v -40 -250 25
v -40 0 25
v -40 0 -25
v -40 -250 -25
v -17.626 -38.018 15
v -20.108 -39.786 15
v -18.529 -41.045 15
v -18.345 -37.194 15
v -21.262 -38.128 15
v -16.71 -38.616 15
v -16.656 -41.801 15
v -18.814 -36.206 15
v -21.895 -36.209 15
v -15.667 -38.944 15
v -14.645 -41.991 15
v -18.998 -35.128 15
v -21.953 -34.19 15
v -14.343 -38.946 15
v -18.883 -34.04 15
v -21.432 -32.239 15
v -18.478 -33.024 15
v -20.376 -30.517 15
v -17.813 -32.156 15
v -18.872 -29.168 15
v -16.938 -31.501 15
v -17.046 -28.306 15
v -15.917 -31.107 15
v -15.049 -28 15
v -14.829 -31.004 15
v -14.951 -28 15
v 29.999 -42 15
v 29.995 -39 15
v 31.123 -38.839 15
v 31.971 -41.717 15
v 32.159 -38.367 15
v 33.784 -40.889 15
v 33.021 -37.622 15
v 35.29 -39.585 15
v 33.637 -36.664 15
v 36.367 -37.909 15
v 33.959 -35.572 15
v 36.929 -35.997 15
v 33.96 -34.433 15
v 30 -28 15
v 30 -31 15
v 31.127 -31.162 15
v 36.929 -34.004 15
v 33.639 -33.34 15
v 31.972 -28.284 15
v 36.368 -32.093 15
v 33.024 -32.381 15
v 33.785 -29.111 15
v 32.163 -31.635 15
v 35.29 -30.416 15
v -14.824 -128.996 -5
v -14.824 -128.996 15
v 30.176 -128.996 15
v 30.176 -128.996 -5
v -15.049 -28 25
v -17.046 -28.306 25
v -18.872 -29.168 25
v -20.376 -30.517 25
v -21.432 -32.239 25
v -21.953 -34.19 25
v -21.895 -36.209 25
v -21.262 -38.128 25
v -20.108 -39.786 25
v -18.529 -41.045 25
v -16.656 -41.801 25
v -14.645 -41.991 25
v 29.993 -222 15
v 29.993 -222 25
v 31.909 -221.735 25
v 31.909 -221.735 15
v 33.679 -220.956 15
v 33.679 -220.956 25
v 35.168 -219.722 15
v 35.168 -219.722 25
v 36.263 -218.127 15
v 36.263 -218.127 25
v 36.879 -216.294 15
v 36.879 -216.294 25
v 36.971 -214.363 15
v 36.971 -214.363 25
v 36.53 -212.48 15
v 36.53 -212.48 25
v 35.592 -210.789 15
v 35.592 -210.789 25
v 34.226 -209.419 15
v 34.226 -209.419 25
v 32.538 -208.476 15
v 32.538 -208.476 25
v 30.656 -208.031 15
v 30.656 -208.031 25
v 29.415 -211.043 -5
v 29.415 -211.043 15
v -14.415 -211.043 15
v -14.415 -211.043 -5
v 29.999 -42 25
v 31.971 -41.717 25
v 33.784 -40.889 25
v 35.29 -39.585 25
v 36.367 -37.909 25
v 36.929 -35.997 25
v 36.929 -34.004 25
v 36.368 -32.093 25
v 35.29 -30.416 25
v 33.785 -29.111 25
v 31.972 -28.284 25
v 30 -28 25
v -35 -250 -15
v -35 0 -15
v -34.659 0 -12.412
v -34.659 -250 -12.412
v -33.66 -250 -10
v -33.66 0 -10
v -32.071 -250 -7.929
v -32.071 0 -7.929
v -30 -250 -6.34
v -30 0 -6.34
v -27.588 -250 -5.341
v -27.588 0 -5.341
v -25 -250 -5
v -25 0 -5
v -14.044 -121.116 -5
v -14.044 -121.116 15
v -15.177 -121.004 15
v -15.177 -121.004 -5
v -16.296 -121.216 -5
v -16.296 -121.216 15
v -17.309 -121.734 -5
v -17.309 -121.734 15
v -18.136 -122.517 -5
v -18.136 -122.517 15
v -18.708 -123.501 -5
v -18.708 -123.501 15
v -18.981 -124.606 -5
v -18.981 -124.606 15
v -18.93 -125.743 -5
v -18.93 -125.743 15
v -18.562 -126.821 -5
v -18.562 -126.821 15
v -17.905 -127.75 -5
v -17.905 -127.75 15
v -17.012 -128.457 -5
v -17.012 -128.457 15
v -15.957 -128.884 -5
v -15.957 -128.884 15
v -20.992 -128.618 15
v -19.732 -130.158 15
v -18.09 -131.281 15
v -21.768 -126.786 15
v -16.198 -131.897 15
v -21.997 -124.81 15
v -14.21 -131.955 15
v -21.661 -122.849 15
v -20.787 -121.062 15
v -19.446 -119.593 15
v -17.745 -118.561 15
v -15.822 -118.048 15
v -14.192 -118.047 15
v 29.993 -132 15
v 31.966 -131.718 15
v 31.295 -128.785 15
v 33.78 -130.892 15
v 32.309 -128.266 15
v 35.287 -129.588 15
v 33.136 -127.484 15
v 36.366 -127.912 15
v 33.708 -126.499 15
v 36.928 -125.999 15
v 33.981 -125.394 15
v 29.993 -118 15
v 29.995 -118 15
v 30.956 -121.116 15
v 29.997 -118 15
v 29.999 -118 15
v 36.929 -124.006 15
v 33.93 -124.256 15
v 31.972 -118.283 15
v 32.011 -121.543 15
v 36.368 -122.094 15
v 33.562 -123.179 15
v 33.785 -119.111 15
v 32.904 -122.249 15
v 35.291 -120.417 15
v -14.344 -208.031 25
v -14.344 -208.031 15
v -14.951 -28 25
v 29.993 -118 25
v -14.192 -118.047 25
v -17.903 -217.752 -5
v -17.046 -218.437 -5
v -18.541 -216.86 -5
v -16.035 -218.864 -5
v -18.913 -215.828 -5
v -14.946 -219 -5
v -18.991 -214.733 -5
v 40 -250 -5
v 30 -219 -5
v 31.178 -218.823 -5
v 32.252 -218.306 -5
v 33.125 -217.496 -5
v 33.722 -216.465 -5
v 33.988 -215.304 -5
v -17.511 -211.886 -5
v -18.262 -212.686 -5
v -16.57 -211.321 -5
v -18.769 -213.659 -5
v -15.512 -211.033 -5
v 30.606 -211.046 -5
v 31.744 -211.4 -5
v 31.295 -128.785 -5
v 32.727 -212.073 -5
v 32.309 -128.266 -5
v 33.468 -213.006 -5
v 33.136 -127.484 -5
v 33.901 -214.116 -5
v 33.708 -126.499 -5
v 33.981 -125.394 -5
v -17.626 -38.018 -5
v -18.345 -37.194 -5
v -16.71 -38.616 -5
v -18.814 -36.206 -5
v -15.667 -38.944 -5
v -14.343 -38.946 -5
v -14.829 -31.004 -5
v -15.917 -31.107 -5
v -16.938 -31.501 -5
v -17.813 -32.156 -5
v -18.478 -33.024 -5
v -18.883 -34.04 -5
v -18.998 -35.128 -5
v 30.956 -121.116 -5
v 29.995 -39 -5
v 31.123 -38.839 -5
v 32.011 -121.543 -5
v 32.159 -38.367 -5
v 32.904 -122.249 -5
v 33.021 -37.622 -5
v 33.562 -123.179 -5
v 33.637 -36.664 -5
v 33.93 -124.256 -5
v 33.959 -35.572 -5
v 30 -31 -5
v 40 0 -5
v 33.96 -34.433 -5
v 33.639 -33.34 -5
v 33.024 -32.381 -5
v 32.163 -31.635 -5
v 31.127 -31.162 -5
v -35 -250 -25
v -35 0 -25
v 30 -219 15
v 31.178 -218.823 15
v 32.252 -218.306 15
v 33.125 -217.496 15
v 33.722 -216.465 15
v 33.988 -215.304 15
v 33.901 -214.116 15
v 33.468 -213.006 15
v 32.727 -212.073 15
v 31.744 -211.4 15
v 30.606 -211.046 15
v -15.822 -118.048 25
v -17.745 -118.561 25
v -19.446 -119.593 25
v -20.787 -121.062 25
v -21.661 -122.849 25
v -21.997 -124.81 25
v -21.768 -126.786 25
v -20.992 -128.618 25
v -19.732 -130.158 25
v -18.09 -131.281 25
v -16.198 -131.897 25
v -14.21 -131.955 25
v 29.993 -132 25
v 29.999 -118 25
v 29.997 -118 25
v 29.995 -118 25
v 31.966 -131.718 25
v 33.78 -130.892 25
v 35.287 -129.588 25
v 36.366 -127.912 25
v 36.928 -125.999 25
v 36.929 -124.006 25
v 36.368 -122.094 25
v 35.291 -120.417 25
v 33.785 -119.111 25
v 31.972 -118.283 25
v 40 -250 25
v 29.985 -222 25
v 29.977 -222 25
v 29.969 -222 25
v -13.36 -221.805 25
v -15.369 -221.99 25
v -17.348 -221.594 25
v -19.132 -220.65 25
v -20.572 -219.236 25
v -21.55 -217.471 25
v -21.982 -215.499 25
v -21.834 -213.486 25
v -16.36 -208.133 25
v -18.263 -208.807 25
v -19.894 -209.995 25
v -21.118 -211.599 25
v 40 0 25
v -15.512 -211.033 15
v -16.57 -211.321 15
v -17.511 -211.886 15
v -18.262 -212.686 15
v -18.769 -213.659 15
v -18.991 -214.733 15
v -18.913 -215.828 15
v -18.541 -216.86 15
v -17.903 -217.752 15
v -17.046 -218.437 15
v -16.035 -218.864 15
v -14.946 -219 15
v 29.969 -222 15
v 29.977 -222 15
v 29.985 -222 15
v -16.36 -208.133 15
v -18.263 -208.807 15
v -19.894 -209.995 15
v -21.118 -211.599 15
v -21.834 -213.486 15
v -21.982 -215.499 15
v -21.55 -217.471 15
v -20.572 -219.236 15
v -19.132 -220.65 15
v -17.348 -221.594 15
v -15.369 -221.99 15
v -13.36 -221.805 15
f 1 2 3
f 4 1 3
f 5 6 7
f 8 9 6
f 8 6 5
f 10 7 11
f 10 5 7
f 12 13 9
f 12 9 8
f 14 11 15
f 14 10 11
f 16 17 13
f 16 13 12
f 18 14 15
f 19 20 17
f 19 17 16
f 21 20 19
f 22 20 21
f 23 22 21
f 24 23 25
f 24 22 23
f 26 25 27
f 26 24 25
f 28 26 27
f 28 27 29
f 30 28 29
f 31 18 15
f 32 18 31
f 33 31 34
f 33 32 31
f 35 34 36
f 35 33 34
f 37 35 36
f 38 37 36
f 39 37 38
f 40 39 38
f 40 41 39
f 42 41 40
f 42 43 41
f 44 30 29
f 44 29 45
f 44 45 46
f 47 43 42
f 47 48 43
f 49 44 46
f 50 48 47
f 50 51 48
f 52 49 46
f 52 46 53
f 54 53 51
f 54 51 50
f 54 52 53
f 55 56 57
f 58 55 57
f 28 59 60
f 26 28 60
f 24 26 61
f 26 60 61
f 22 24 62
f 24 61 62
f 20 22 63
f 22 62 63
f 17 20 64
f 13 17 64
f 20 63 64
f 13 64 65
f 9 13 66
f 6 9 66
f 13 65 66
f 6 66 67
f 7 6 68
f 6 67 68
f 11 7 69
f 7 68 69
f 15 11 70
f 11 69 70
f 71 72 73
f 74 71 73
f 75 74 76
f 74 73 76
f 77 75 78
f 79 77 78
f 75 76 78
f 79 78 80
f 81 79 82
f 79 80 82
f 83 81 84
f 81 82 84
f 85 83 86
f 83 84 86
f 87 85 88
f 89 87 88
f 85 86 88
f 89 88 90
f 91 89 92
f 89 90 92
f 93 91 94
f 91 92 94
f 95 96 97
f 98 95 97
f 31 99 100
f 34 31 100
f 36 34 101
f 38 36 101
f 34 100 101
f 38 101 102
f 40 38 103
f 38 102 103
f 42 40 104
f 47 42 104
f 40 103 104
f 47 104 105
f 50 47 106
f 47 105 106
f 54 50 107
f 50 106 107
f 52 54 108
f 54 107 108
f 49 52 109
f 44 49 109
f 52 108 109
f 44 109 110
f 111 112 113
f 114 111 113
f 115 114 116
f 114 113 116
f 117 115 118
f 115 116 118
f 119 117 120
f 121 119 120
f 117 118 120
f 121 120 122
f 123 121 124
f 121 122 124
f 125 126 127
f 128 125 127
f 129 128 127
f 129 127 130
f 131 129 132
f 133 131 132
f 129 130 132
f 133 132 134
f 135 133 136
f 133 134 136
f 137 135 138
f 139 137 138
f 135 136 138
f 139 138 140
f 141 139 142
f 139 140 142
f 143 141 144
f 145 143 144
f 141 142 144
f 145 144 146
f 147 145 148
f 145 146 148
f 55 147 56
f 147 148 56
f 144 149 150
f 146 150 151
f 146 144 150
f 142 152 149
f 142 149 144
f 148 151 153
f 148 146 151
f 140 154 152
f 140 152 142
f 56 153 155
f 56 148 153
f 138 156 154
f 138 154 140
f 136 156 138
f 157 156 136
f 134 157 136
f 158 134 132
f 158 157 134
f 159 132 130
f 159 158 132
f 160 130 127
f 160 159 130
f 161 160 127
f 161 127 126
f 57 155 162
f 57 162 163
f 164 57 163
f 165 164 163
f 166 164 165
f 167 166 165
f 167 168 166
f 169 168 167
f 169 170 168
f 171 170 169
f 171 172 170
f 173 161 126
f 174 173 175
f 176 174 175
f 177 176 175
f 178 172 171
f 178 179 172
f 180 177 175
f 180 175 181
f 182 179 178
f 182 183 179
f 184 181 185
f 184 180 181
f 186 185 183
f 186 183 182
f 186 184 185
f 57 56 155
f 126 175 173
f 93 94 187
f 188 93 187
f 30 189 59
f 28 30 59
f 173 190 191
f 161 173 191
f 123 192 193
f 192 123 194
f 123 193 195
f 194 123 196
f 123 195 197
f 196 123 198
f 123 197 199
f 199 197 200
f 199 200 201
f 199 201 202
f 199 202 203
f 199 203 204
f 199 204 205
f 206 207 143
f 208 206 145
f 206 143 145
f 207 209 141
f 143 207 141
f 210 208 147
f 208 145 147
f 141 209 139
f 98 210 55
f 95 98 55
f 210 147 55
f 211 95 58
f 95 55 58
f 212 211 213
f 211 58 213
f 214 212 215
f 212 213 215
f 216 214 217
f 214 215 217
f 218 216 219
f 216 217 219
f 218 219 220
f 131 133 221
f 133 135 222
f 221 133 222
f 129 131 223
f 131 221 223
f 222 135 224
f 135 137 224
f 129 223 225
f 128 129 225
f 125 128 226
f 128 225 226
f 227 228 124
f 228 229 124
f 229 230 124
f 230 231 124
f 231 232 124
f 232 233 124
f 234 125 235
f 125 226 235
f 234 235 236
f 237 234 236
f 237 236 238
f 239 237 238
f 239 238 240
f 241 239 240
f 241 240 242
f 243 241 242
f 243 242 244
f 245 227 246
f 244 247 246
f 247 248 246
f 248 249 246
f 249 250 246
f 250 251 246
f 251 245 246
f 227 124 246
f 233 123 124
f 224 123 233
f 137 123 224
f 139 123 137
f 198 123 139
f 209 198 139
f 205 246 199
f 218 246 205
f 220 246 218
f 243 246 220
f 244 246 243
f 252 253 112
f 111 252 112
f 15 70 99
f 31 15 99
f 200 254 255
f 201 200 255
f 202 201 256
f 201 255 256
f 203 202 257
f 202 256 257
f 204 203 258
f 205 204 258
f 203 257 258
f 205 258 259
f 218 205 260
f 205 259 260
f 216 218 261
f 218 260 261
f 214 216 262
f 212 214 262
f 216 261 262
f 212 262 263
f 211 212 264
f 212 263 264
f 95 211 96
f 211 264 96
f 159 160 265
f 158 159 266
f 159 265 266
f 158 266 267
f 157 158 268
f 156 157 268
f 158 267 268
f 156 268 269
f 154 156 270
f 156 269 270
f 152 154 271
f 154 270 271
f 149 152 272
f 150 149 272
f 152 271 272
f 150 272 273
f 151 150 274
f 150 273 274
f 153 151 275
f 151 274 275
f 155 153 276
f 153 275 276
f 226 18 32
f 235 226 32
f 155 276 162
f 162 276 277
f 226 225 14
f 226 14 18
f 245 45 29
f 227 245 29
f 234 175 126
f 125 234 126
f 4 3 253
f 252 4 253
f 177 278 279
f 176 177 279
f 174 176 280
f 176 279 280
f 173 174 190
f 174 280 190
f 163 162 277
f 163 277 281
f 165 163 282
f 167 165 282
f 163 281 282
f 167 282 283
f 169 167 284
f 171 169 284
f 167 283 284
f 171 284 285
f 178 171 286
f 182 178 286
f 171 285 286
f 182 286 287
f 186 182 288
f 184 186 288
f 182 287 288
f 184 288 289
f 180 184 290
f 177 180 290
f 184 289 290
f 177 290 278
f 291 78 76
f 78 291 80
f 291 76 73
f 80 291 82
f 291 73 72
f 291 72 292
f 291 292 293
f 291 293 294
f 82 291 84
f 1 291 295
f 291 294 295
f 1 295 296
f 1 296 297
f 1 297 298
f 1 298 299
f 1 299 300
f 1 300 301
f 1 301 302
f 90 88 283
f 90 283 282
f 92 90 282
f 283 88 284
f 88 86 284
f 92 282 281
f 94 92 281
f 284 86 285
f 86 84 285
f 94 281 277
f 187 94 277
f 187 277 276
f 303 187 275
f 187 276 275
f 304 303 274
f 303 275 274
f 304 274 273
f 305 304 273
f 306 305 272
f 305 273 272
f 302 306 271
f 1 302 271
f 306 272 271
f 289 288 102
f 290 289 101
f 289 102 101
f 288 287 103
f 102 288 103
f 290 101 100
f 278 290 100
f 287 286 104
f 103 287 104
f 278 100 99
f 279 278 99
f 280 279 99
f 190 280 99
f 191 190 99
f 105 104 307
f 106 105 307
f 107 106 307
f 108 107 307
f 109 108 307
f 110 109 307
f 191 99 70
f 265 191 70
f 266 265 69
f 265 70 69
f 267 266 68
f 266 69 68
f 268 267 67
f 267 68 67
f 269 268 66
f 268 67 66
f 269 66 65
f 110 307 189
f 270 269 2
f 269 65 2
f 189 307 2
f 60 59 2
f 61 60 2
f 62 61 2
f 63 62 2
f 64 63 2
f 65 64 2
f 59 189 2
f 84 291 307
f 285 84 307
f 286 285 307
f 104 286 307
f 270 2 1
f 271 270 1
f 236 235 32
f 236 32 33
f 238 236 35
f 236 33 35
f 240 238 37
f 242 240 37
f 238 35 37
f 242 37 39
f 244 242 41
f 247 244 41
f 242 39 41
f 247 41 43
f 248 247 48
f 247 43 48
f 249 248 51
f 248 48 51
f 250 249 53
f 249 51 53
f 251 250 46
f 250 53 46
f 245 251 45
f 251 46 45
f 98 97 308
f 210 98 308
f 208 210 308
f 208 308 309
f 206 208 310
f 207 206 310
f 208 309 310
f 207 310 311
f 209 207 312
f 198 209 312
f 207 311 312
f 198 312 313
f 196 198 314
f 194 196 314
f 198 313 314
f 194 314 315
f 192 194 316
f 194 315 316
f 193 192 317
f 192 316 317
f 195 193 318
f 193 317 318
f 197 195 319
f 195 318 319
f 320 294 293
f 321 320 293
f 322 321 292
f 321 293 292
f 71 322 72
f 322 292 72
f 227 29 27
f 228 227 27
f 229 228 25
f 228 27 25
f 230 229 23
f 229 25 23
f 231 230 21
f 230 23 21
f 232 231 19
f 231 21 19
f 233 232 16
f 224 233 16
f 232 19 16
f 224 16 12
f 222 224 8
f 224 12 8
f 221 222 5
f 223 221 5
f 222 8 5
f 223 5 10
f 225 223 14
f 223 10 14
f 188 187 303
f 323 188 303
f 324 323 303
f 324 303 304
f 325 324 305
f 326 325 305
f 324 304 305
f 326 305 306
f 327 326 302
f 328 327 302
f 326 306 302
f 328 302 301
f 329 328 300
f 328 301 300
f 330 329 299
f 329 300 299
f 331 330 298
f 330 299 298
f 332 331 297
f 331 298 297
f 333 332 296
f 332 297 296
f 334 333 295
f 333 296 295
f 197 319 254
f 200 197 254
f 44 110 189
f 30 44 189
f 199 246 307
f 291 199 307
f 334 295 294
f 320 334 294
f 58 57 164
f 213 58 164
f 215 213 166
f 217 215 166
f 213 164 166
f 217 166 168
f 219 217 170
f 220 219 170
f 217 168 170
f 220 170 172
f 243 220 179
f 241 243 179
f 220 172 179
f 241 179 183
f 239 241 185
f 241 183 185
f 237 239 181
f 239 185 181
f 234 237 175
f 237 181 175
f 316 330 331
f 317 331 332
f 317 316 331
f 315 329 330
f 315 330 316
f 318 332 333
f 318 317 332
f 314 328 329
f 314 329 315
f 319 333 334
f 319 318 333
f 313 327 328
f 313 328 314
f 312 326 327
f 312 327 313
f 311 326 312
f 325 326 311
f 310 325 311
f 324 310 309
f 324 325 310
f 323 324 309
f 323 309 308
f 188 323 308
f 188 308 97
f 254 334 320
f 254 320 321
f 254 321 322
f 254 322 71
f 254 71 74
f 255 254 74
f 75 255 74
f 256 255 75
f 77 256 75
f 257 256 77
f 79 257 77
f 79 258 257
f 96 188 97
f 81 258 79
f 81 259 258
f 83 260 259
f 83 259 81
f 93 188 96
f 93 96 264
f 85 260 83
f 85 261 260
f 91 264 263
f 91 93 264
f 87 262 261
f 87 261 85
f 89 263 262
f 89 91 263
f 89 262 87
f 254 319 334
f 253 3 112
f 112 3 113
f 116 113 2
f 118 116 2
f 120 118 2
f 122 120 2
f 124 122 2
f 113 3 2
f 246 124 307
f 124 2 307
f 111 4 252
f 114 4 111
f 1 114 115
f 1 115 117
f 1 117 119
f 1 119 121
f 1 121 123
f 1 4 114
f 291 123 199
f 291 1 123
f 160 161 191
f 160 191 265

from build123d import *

# Parameters (mm, degrees)
F1_DEPTH = 250
F4_DEPTH = 10
F6_DEPTH = 108


with BuildPart() as f1:
    # F0 (on Front) → F1 (new body)
    with BuildSketch(Plane.XZ):
        with BuildLine():
            Line((-40, 25), (-40, -25))
            Line((-40, -25), (-35, -25))
            Line((-35, -25), (-35, -15))
            ThreePointArc((-35, -15), (-32.0710678119, -7.9289321881), (-25, -5))
            Line((-25, -5), (40, -5))
            Line((40, -5), (40, 25))
            Line((40, 25), (-40, 25))
        make_face()
    extrude(amount=F1_DEPTH)

    # F3 (on offset) → F4 (cut)
    with BuildSketch(Plane.XY.offset(25)):
        with BuildLine():
            Line((-14.2098601364, -131.9552626835), (29.9929159209, -131.9999964154))
            ThreePointArc((29.9929159209, -131.9999964154), (36.9999994254, -125.0028362987), (29.9985885173, -118.0000001423))
            ThreePointArc((29.9985885173, -118.0000001423), (29.9955916852, -118.0000013881), (29.992594854, -118.0000039169))
            Line((29.992594854, -118.0000039169), (-14.1923724524, -118.0467462477))
            Line((-14.1923724524, -118.0467462477), (-15.82233712, -118.0484705524))
            ThreePointArc((-15.82233712, -118.0484705524), (-21.9534147014, -125.8062406526), (-14.2098601364, -131.9552626835))
        make_face()
        with BuildLine():
            Line((-13.3595939823, -221.8050766415), (29.9685203418, -221.9999292162))
            ThreePointArc((29.9685203418, -221.9999292162), (29.9807181236, -221.9999734435), (29.9929159639, -221.9999964155))
            ThreePointArc((29.9929159639, -221.9999964155), (36.9921369062, -215.3316948665), (30.6555919845, -208.0307676786))
            Line((30.6555919845, -208.0307676786), (29.3444080155, -208.0307676786))
            Line((29.3444080155, -208.0307676786), (-14.3444080155, -208.0307676786))
            ThreePointArc((-14.3444080155, -208.0307676786), (-21.9821772076, -215.4992008031), (-13.3595939823, -221.8050766415))
        make_face()
        with BuildLine():
            Line((-14.6451076001, -41.9909978819), (29.9985885167, -41.9999998577))
            ThreePointArc((29.9985885167, -41.9999998577), (36.9999999657, -35.0006925131), (29.9999735429, -28))
            Line((29.9999735429, -28), (-14.9512298512, -28.0001698969))
            Line((-14.9512298512, -28.0001698969), (-15.0488230617, -28.0001702657))
            ThreePointArc((-15.0488230617, -28.0001702657), (-21.9970875338, -35.2019060274), (-14.6451076001, -41.9909978819))
        make_face()
    extrude(amount=-F4_DEPTH, mode=Mode.SUBTRACT)

    # F5 (on offset) → F6 (cut)
    with BuildSketch(Plane.XY.offset(25)):
        with BuildLine():
            Line((-14.9462072807, -218.9996382766), (29.9999678083, -218.9999999999))
            ThreePointArc((29.9999678083, -218.9999999999), (33.989222508, -214.7065655416), (29.4146804818, -211.0430566012))
            Line((29.4146804818, -211.0430566012), (-14.4146804818, -211.0430566012))
            ThreePointArc((-14.4146804818, -211.0430566012), (-18.9911043713, -214.7333806128), (-14.9462072807, -218.9996382766))
        make_face()
        with BuildLine():
            Line((-14.8239530385, -128.9961240555), (29.8239530385, -128.9961240555))
            Line((29.8239530385, -128.9961240555), (30.1760469615, -128.9961240555))
            ThreePointArc((30.1760469615, -128.9961240555), (33.9805586423, -125.3938945231), (30.9558331647, -121.1158806711))
            Line((30.9558331647, -121.1158806711), (29.0441668353, -121.1158806711))
            Line((29.0441668353, -121.1158806711), (-14.0441668353, -121.1158806711))
            ThreePointArc((-14.0441668353, -121.1158806711), (-18.9805586423, -124.6061054769), (-14.8239530385, -128.9961240555))
        make_face()
        with BuildLine():
            Line((-14.342635605, -38.9456142807), (29.9950937795, -38.9999969911))
            ThreePointArc((29.9950937795, -38.9999969911), (33.9999993449, -35.0022892167), (29.999672212, -31.0000000134))
            Line((29.999672212, -31.0000000134), (-14.8286087531, -31.0036735568))
            ThreePointArc((-14.8286087531, -31.0036735568), (-18.9778854783, -34.5799677135), (-15.6670414367, -38.9439898227))
            Line((-15.6670414367, -38.9439898227), (-14.342635605, -38.9456142807))
        make_face()
    extrude(amount=-F6_DEPTH, mode=Mode.SUBTRACT)


solid = f1.part
